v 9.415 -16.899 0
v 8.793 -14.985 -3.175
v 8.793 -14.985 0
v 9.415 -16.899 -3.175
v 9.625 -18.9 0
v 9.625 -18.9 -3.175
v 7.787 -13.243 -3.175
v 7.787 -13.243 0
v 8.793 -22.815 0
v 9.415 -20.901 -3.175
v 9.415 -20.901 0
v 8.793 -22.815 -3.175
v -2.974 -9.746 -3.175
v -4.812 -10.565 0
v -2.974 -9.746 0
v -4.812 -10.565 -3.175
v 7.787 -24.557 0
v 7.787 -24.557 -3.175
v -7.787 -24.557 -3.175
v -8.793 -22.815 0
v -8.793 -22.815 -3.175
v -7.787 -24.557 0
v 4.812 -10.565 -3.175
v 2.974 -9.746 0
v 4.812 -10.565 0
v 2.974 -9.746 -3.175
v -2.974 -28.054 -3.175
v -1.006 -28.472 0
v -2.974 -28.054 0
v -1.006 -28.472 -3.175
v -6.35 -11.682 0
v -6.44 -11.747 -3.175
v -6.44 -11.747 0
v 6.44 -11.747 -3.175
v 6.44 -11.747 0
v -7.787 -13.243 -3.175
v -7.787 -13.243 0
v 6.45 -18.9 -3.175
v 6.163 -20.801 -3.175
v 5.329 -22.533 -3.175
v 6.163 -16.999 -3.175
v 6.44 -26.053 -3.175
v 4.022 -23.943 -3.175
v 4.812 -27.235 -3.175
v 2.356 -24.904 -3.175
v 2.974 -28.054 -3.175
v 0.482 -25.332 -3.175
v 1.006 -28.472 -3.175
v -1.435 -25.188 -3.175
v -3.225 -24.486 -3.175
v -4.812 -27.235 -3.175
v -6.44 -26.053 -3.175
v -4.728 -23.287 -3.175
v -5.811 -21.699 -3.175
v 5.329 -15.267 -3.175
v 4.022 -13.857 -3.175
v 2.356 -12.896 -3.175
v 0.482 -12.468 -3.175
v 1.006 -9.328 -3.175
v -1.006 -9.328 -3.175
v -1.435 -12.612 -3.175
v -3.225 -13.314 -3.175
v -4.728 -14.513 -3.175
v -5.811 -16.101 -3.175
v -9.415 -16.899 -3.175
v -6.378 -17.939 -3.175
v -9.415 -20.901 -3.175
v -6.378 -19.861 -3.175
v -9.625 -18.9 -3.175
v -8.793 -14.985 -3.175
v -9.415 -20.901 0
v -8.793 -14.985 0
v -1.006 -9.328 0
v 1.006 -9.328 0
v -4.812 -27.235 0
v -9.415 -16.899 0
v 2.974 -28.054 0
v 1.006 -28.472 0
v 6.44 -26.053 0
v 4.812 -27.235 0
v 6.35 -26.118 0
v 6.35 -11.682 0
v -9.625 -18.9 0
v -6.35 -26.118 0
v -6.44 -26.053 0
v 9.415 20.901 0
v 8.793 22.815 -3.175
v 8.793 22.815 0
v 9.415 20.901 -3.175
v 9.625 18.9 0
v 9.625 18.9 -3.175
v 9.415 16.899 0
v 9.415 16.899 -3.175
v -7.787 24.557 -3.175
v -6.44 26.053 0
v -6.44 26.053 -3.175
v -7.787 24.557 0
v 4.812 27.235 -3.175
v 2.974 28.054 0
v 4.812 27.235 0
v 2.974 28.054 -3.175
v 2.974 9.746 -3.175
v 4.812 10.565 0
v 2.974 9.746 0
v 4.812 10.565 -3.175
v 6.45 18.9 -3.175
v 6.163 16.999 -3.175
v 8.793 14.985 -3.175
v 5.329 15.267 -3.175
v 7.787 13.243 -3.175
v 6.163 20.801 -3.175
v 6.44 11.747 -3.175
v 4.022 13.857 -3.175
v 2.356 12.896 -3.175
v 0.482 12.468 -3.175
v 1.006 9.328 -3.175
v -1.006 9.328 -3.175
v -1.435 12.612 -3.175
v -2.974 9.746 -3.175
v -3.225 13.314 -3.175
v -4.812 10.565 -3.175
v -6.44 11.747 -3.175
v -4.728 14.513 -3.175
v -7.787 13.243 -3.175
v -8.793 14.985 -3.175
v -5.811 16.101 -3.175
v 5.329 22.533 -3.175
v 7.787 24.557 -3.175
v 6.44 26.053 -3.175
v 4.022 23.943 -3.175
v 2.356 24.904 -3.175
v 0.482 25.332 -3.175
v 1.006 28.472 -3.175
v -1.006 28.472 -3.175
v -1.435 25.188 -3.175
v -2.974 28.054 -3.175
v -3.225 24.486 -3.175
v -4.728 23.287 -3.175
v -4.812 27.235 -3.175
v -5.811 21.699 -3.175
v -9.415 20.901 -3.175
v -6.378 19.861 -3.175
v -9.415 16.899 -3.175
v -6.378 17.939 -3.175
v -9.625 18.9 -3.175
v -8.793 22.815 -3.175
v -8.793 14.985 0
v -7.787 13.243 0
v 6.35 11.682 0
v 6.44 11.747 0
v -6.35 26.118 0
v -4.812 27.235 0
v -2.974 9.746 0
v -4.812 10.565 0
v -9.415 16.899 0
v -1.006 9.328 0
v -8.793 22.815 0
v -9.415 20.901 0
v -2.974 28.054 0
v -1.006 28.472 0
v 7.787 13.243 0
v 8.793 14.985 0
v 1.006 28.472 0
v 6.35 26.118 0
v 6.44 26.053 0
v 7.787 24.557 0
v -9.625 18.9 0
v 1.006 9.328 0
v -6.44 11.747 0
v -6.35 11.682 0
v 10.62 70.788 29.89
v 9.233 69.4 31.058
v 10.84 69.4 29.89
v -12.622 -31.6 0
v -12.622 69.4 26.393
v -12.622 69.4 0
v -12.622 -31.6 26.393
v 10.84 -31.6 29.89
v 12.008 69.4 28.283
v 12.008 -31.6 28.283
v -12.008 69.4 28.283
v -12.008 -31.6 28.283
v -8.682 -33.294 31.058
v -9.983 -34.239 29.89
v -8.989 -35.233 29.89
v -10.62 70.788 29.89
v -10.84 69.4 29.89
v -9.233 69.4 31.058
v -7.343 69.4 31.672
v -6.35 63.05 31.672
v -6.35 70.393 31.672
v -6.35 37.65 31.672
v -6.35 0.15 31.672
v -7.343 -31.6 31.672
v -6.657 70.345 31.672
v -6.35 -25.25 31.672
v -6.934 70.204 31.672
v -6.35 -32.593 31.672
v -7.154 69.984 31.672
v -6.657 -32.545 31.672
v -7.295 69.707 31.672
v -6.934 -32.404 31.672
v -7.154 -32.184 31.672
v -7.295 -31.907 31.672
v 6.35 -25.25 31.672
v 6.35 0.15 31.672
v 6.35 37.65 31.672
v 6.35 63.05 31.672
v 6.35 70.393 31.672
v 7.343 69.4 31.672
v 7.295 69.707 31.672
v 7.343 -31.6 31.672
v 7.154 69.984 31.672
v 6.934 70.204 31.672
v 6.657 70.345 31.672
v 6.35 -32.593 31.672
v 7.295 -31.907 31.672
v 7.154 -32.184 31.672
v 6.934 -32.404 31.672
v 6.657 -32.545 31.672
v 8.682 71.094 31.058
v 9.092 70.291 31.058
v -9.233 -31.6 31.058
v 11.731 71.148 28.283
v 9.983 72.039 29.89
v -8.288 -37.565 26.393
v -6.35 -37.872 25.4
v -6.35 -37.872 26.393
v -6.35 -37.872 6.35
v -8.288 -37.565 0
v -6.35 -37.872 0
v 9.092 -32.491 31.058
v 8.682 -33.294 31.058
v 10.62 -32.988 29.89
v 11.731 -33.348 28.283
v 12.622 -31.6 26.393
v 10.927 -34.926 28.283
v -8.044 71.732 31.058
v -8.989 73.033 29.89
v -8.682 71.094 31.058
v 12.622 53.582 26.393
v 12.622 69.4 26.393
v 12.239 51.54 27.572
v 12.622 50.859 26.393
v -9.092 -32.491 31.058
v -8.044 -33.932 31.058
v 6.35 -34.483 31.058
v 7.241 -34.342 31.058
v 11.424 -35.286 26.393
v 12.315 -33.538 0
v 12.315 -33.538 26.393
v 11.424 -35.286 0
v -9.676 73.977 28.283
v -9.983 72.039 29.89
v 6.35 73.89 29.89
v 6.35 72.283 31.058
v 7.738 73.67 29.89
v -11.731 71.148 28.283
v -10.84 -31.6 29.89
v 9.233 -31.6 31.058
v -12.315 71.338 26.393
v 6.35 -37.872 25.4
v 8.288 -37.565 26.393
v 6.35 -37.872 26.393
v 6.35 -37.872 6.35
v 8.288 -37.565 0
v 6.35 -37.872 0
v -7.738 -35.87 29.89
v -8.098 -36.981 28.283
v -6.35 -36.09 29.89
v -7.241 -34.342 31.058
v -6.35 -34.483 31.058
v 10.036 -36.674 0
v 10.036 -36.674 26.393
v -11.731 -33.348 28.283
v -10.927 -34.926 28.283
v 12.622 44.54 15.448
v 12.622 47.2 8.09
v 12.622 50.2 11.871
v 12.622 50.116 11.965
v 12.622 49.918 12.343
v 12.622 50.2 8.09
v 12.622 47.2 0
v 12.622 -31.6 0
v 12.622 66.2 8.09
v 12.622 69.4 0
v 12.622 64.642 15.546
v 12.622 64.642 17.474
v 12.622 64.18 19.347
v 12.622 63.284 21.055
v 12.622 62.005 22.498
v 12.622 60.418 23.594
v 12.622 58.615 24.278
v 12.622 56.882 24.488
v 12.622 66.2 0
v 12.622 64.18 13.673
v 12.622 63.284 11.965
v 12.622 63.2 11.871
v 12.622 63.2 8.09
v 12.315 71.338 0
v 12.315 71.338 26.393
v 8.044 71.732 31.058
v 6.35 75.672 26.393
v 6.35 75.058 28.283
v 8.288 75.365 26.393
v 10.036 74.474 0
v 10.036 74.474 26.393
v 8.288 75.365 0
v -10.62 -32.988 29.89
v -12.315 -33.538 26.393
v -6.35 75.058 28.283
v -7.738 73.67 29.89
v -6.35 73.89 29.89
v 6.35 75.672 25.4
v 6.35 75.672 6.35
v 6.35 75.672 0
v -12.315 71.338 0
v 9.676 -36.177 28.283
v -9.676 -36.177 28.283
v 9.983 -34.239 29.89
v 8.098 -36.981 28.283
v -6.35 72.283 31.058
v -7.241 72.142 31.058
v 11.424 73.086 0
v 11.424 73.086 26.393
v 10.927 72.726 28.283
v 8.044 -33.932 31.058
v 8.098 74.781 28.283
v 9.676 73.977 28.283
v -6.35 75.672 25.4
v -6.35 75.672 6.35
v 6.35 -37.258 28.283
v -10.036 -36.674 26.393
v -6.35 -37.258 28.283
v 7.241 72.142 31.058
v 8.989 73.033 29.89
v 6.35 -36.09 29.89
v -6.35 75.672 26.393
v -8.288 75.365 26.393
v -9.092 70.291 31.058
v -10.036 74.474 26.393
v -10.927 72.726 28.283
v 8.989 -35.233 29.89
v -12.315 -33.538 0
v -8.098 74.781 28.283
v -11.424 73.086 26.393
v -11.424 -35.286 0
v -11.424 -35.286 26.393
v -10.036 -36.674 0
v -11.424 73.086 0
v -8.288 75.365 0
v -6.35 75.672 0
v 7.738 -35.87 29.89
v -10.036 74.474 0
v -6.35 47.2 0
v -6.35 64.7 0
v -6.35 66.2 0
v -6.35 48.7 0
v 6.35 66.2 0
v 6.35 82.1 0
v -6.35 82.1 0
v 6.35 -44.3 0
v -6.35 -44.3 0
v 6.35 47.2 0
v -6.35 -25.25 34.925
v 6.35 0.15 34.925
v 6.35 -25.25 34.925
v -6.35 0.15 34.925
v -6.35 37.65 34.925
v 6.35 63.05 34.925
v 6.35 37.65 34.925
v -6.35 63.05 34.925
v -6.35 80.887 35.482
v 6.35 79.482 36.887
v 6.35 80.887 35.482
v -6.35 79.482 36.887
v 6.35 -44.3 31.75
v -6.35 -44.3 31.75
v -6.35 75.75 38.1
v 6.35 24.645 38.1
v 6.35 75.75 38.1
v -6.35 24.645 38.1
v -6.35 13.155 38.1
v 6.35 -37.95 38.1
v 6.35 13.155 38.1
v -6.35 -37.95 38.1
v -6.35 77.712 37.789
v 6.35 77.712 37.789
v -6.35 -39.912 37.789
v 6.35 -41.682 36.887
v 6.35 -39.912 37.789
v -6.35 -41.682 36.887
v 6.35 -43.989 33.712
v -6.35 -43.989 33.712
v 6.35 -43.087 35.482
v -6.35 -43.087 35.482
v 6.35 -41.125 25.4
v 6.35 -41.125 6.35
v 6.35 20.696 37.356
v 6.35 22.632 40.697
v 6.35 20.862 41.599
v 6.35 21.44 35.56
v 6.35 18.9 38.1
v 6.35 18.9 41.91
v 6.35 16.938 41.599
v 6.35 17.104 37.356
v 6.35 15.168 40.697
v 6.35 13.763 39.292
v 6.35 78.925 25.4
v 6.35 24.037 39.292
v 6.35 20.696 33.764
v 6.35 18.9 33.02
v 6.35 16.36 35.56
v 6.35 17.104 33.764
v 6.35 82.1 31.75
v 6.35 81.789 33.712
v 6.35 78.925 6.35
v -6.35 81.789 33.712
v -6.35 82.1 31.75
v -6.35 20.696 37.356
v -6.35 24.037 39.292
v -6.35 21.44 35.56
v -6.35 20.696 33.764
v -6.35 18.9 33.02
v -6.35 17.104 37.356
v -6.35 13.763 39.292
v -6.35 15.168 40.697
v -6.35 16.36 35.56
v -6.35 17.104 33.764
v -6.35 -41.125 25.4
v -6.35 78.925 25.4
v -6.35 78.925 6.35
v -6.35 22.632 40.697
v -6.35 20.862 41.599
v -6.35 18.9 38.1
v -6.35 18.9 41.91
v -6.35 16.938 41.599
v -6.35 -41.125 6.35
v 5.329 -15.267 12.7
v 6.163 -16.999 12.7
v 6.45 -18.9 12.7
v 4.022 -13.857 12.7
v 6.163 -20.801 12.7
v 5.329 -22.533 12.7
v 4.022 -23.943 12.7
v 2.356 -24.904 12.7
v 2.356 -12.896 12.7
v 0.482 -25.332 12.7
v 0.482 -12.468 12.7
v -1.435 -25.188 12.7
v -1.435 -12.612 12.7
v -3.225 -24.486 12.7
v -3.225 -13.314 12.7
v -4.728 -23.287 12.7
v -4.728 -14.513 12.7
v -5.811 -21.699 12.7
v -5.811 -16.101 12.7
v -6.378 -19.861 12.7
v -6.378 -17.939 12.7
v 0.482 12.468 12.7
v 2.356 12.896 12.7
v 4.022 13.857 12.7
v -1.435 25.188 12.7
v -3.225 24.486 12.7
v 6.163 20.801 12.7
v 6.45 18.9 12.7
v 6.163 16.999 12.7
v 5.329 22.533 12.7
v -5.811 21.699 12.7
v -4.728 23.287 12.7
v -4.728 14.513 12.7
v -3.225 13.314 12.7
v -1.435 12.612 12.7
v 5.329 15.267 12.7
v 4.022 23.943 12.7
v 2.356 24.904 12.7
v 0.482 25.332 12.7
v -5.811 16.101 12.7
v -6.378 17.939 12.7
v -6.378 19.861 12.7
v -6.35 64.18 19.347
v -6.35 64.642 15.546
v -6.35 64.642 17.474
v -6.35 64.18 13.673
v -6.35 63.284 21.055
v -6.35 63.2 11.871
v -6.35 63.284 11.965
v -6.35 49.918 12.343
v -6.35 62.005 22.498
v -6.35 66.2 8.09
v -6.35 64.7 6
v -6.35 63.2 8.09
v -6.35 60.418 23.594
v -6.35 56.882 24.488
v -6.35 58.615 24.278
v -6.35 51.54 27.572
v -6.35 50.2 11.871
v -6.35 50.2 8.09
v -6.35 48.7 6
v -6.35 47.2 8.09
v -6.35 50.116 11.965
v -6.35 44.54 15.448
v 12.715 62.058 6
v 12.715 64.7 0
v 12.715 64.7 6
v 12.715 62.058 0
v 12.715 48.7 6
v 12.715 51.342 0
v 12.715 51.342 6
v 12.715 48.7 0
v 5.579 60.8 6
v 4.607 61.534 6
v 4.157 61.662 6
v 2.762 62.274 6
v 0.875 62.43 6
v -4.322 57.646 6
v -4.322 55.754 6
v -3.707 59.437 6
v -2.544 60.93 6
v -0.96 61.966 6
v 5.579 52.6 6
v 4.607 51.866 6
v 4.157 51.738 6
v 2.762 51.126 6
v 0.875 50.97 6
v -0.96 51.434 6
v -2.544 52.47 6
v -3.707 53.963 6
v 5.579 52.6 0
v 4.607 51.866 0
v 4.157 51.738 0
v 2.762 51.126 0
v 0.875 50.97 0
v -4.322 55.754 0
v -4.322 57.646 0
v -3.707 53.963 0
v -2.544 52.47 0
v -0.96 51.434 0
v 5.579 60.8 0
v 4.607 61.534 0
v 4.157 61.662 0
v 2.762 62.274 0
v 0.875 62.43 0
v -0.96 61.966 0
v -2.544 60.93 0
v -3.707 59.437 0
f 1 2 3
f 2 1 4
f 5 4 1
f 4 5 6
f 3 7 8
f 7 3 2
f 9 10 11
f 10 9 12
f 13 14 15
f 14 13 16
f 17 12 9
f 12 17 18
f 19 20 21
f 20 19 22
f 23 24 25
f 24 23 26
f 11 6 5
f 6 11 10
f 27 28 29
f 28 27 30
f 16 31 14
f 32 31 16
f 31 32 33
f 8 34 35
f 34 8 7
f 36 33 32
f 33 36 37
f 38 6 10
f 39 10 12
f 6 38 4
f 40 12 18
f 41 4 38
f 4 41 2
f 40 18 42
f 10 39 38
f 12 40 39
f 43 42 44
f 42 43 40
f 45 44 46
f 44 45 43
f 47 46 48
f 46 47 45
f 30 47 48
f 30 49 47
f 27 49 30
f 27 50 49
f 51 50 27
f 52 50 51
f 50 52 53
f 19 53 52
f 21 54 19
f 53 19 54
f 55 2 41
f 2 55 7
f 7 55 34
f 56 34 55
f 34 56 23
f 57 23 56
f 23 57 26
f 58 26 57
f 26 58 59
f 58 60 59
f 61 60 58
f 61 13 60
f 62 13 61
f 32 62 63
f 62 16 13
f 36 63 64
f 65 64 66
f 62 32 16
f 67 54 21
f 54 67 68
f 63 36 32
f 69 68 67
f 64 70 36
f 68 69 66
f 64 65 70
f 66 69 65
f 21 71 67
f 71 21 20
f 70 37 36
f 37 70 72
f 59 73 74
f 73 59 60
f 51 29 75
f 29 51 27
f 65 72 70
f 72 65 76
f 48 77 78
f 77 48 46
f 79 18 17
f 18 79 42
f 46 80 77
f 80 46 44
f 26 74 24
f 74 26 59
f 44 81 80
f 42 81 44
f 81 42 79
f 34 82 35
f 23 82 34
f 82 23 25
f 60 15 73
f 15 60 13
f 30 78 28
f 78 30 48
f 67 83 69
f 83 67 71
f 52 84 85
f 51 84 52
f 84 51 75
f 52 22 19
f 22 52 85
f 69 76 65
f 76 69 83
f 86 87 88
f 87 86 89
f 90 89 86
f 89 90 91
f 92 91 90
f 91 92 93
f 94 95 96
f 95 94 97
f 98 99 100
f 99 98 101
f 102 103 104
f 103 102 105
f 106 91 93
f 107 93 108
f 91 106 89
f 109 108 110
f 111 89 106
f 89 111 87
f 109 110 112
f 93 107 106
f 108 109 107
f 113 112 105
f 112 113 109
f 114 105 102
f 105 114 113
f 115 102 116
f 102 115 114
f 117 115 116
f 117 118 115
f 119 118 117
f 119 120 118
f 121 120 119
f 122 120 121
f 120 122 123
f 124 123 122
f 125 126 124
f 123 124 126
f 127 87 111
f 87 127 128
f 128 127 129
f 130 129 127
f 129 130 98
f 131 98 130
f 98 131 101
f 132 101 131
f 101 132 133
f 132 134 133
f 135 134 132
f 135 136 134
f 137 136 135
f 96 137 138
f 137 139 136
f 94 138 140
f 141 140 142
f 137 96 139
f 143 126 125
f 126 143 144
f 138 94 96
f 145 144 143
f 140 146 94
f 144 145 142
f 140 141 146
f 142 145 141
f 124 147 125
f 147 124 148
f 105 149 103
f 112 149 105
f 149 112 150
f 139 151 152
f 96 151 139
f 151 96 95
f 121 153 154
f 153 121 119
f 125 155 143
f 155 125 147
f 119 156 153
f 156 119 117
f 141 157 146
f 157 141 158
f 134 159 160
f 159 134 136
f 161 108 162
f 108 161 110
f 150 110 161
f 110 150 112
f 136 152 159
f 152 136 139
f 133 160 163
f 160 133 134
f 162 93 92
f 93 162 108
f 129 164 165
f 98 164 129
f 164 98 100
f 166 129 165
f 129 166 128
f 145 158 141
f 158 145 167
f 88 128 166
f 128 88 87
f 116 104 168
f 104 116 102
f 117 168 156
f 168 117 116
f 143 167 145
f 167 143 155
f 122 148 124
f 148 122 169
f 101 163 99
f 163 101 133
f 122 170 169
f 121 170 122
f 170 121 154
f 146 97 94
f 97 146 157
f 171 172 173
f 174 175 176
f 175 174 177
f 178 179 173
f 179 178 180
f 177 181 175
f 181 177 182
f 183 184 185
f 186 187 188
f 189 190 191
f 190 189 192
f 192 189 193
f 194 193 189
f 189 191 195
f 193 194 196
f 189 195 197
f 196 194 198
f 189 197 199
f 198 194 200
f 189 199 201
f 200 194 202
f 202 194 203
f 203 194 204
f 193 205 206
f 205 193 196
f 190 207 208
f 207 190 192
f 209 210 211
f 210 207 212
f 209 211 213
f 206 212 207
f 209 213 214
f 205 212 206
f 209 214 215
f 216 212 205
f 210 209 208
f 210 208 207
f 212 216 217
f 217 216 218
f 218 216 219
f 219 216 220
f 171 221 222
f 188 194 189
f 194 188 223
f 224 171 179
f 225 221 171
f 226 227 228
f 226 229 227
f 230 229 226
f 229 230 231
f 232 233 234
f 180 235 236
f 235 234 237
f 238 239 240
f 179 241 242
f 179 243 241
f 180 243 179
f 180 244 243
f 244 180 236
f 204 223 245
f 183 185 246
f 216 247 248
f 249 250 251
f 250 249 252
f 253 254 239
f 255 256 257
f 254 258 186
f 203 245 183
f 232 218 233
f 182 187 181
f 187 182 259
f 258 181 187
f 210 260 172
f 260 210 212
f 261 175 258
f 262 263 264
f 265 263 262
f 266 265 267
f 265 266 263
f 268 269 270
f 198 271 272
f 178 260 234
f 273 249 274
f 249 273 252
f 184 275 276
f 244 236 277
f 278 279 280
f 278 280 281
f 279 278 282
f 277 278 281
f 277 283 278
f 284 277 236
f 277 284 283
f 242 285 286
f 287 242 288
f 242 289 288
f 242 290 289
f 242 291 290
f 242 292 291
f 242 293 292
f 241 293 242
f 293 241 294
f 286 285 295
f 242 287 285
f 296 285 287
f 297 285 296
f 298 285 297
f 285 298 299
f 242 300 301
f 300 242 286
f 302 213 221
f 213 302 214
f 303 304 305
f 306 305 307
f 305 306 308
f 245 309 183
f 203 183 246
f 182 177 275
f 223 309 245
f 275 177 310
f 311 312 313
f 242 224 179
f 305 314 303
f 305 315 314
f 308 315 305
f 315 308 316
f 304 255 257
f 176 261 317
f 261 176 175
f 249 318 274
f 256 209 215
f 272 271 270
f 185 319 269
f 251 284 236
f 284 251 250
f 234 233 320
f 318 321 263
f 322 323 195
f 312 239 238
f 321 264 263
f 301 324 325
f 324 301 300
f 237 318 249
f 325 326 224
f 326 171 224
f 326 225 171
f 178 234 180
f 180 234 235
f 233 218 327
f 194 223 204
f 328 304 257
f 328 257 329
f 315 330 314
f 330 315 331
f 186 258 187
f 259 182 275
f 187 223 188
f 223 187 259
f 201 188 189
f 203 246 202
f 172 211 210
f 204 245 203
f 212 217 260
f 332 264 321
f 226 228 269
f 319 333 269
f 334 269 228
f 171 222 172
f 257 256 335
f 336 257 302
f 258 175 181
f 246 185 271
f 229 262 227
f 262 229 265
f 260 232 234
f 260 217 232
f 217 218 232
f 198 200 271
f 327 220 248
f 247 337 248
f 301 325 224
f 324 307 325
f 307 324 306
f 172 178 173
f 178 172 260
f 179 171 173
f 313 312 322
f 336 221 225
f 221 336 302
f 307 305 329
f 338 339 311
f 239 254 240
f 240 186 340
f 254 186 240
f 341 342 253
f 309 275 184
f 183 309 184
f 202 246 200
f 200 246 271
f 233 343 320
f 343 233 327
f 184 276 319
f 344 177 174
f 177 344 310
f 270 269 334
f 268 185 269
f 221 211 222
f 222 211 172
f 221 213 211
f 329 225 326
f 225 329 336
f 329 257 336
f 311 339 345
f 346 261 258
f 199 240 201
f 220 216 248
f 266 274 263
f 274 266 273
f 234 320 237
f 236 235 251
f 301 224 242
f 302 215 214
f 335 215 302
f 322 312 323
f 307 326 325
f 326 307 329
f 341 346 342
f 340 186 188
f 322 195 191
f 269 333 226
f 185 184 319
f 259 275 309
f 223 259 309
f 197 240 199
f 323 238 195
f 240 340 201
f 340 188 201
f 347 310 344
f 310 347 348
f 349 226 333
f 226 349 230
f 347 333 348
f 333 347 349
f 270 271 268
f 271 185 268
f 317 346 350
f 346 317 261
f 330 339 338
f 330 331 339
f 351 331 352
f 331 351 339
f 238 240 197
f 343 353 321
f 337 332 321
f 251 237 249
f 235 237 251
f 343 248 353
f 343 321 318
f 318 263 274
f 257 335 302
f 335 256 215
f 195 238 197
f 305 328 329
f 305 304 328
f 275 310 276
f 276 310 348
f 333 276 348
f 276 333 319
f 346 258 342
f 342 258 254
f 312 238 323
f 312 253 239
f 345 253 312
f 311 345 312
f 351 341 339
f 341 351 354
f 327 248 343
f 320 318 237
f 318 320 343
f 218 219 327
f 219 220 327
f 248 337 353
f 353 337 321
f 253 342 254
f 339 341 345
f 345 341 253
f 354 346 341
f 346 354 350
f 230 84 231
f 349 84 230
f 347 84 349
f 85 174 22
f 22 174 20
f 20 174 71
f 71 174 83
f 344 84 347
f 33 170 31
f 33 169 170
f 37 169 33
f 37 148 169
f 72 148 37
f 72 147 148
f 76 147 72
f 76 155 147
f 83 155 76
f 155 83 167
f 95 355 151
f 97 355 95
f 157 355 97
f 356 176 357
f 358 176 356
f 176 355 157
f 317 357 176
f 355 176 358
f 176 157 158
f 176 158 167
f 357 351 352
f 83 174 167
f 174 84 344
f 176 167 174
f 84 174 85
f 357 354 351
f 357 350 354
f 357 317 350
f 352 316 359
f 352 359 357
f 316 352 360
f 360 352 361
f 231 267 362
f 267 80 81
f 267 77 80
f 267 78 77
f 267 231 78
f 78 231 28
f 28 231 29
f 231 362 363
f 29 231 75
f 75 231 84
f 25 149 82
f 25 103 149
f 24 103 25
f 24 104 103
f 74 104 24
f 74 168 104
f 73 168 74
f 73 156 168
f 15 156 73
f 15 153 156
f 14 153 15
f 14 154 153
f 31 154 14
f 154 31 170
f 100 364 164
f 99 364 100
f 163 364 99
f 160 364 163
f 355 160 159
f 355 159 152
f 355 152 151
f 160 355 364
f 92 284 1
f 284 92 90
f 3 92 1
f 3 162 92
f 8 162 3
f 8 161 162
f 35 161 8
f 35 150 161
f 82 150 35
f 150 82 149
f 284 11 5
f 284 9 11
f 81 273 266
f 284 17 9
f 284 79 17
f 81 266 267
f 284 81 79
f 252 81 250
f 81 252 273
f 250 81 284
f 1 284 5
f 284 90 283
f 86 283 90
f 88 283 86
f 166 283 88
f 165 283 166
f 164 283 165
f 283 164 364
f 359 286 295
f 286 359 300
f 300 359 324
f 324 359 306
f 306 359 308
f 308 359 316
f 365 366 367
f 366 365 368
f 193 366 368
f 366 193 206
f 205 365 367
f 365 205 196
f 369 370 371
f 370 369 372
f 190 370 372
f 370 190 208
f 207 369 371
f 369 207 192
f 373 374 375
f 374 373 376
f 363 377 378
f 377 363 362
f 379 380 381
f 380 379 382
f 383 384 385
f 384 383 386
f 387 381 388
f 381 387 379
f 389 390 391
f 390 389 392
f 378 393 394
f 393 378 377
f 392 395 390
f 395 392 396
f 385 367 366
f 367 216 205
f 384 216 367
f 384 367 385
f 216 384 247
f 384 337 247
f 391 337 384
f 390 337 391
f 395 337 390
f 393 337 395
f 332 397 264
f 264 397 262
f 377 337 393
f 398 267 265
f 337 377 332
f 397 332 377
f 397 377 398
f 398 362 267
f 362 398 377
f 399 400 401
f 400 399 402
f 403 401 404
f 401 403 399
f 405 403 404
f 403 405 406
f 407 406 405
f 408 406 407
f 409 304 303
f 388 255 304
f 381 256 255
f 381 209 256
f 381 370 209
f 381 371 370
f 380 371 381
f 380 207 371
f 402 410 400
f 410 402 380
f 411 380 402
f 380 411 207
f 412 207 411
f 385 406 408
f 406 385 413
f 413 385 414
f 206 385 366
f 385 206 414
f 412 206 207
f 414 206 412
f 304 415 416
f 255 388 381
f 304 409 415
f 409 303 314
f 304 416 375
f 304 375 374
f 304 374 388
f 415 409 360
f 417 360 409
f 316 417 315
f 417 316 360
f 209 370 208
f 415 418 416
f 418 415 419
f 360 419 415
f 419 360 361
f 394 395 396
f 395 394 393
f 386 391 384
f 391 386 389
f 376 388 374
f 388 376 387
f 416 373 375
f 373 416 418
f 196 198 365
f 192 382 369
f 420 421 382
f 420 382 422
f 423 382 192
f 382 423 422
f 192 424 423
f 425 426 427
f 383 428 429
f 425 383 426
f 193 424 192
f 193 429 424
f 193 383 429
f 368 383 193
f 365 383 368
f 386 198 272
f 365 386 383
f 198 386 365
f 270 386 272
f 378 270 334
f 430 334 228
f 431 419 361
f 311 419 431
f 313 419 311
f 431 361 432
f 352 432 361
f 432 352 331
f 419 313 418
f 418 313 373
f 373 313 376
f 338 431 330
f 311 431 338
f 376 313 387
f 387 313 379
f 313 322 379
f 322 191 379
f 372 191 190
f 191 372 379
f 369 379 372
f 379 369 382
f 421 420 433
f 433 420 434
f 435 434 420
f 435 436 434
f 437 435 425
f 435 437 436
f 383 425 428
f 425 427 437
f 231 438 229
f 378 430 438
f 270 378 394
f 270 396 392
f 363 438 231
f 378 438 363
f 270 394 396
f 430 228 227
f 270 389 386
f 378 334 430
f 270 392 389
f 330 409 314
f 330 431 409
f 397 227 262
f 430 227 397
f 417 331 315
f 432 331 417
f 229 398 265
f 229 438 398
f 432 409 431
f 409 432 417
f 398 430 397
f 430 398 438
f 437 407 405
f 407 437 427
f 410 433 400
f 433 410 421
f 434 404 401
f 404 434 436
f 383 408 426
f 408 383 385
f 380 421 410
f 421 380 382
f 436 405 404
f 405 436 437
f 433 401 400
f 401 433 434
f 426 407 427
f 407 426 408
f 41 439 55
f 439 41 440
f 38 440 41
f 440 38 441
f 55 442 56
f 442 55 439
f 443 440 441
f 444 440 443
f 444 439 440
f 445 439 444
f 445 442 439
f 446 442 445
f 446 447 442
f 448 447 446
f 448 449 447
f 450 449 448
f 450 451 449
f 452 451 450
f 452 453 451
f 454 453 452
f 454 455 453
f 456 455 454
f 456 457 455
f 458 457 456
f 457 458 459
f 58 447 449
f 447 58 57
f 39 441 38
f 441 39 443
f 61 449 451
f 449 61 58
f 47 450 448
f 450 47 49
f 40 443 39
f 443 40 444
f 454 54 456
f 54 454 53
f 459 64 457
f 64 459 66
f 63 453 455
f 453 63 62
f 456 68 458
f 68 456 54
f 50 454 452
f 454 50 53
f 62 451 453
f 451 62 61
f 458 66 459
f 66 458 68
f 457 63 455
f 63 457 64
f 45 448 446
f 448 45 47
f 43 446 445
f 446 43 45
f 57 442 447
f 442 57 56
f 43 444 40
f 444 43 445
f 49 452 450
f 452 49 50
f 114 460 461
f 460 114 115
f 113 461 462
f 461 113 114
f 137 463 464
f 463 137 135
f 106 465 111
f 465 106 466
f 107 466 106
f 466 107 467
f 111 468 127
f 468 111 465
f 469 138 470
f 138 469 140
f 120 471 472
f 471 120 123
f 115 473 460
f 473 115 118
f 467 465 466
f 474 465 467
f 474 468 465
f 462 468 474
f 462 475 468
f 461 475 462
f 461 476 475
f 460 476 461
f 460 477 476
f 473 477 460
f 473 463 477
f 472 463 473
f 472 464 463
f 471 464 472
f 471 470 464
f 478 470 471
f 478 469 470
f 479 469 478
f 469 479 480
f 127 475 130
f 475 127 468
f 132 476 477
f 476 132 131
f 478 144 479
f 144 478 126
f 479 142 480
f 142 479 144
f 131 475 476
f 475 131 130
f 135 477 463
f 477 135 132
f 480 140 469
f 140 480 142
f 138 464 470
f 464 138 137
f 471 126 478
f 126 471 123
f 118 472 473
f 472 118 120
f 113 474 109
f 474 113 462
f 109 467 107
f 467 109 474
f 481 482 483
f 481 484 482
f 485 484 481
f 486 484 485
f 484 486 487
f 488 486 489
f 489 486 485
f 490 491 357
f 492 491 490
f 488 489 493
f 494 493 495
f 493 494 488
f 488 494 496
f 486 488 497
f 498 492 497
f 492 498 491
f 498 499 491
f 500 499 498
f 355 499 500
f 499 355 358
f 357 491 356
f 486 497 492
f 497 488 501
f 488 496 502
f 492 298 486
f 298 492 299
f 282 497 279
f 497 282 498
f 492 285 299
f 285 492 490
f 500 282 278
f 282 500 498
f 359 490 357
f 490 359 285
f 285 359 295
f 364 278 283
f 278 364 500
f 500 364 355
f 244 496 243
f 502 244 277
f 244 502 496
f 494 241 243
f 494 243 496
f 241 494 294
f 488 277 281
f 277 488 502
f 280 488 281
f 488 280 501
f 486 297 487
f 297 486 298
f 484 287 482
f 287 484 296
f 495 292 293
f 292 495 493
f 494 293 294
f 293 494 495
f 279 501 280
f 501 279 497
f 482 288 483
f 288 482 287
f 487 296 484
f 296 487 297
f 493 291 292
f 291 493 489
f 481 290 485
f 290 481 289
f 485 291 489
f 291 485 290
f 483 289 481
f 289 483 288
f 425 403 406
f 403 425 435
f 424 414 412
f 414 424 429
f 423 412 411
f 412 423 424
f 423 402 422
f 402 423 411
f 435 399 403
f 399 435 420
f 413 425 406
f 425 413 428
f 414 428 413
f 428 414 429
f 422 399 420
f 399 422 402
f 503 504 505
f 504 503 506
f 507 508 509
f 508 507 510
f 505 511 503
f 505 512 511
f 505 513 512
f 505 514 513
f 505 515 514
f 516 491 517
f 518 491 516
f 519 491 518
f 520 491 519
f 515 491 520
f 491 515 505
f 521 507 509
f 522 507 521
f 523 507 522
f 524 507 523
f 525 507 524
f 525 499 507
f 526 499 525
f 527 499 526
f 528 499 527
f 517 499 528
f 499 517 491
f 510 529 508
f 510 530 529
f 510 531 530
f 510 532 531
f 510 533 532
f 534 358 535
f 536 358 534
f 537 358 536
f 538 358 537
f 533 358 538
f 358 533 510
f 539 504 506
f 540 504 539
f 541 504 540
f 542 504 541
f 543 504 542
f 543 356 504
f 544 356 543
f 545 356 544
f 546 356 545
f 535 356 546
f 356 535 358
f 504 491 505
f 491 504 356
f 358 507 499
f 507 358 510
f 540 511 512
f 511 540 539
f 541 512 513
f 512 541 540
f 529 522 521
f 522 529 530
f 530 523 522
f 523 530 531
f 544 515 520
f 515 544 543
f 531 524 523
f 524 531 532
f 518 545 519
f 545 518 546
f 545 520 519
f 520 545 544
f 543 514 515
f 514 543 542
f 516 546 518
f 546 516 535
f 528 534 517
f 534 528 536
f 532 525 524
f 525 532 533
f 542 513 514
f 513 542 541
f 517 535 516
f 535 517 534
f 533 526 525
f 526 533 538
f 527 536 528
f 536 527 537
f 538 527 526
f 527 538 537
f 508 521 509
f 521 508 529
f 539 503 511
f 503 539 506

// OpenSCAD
//air compressor tool caddy
//designed by: Andrew Herren
//modified: 7/22/13

// preview[view:east, tilt:bottom diagonal]
tools=2; //[1:10]
spacing=25.2*1.5;
center_hanger=1; //[1:On,0:Off]
pressure_guage=1; //[1:On,0:Off]



difference(){
union(){
if(center_hanger==1 || tools==1){
translate([-25.4/4,pressure_guage*spacing/2,25.4*1.4])rotate([0,90,0])cylinder(25.4/2,25.4/4,25.4/4);
}
for(i=[0:tools-1]){
translate([0,((-25.4*2-(tools-1)*spacing)/2)+25.4+(i*spacing),-25.4/8])cylinder(25.4,6.45+(25.4/8),6.45+(25.4/8));
}
difference(){
translate([25.4/4,(((tools-1)*spacing)+(25.4*1.25))/2,0])minkowski(){
translate([-25.4/4,(-(25.4*.75)-(tools-1)*spacing)/2,0])sphere(25.4/4);
translate([-25.4/4,(-25.4*1.5-(tools-1)*spacing)/2,0])cube([25.4/2,((tools-1)*spacing)+25.4+(pressure_guage*spacing),25.4]);
}
translate([-25.4,-(tools*spacing+(2*25.4))/2,-20])cube([25.4*2,tools*spacing+(2*25.4)+(pressure_guage*spacing),20]);
}
difference(){
hull(){
translate([-25.4/4,-(((tools-1)*spacing)+(25.4*2))/2,0])cube([25.4/2,((tools-1)*spacing)+(25.4*2)+(pressure_guage*spacing),25.4]);
translate([-25.4/4,-(((tools-1)*spacing)+25.4*1.5)/2,25.4*1.25])rotate([0,90,0])cylinder(25.4/2,25.4/4,25.4/4);
translate([-25.4/4,(((tools-1)*spacing)+25.4*1.5)/2+(pressure_guage*spacing),25.4*1.25])rotate([0,90,0])cylinder(25.4/2,25.4/4,25.4/4);
}
translate([-25.4/2,-(((tools-1)*spacing)+(25.4*1.75))/2,25.4/4])cube([25.4,((tools-1)*spacing)+(25.4*1.75)+(pressure_guage*spacing),25.4*.75]);
if(tools>1){
translate([-25.4/2,((-25.4/2)-(tools-1)*spacing)/2,25.4*(5/8)])cube([25.4,25.4,25.4*.75]);
translate([-25.4/2,((-25.4*1.5)+(tools-1)*spacing)/2+(pressure_guage*spacing),25.4*(5/8)])cube([25.4,25.4,25.4*.75]);
}
}
}
if(center_hanger==1 || tools==1){
translate([-25.4/2,(pressure_guage*spacing)/2,25.4*1.4])rotate([0,90,0])cylinder(25.4,25.4/10,25.4/10);
}
for(i=[0:tools-1]){
translate([0,((-25.4*2-(tools-1)*spacing)/2)+25.4+(i*spacing),-25.4/2])cylinder(25.4,6.45,6.45);
}
if(pressure_guage==1){
translate([-25.4*.25,((-25.4*2-(tools-1)*spacing)/2)+25.4+(tools*spacing)-6.5,-25.4*1.45])cube([25.42,13,50]);
translate([-25.4*.25,((-25.4*2-(tools-1)*spacing)/2)+25.4+(tools*spacing)-9.5,-25.4*1.65])cube([25.42,19,50]);
translate([-25.4*.25,((-25.4*2-(tools-1)*spacing)/2)+25.4+(tools*spacing),25.4*.65])rotate([60,0,0])translate([0,-7,0])cube([25.4,14,10]);
translate([-25.4*.25,((-25.4*2-(tools-1)*spacing)/2)+25.4+(tools*spacing),25.4*.65])rotate([0,90,0])cylinder(25.42,8,8);
}
}

if(pressure_guage==1){
difference(){
translate([-25.4*.25,((-25.4*2-(tools-1)*spacing)/2)+25.4+(tools*spacing)-8,0])cube([25.42*.75,16,6]);
translate([(25.4*.25)-4.15,((-25.4*2-(tools-1)*spacing)/2)+25.4+(tools*spacing),-2])cylinder(10,5.4,5.4);
translate([(25.4*.25)-5,((-25.4*2-(tools-1)*spacing)/2)+25.4+(tools*spacing),-2])cylinder(10,5.75,5.75);
translate([(25.4*.25)-4.85,((-25.4*2-(tools-1)*spacing)/2)+25.4+(tools*spacing)-3,-2])cube([25.42*.5,6,10]);
translate([(25.4*.5)-4.85,((-25.4*2-(tools-1)*spacing)/2)+25.4+(tools*spacing)-4.5,-2])rotate([0,0,-10])translate([-25.4*.25,0,0])cube([25.42*.5,4,10]);
translate([(25.4*.5)-4.85,((-25.4*2-(tools-1)*spacing)/2)+25.4+(tools*spacing)+4.5,-2])rotate([0,0,10])translate([-25.4*.25,-4,0])cube([25.42*.5,4,10]);
}
}
